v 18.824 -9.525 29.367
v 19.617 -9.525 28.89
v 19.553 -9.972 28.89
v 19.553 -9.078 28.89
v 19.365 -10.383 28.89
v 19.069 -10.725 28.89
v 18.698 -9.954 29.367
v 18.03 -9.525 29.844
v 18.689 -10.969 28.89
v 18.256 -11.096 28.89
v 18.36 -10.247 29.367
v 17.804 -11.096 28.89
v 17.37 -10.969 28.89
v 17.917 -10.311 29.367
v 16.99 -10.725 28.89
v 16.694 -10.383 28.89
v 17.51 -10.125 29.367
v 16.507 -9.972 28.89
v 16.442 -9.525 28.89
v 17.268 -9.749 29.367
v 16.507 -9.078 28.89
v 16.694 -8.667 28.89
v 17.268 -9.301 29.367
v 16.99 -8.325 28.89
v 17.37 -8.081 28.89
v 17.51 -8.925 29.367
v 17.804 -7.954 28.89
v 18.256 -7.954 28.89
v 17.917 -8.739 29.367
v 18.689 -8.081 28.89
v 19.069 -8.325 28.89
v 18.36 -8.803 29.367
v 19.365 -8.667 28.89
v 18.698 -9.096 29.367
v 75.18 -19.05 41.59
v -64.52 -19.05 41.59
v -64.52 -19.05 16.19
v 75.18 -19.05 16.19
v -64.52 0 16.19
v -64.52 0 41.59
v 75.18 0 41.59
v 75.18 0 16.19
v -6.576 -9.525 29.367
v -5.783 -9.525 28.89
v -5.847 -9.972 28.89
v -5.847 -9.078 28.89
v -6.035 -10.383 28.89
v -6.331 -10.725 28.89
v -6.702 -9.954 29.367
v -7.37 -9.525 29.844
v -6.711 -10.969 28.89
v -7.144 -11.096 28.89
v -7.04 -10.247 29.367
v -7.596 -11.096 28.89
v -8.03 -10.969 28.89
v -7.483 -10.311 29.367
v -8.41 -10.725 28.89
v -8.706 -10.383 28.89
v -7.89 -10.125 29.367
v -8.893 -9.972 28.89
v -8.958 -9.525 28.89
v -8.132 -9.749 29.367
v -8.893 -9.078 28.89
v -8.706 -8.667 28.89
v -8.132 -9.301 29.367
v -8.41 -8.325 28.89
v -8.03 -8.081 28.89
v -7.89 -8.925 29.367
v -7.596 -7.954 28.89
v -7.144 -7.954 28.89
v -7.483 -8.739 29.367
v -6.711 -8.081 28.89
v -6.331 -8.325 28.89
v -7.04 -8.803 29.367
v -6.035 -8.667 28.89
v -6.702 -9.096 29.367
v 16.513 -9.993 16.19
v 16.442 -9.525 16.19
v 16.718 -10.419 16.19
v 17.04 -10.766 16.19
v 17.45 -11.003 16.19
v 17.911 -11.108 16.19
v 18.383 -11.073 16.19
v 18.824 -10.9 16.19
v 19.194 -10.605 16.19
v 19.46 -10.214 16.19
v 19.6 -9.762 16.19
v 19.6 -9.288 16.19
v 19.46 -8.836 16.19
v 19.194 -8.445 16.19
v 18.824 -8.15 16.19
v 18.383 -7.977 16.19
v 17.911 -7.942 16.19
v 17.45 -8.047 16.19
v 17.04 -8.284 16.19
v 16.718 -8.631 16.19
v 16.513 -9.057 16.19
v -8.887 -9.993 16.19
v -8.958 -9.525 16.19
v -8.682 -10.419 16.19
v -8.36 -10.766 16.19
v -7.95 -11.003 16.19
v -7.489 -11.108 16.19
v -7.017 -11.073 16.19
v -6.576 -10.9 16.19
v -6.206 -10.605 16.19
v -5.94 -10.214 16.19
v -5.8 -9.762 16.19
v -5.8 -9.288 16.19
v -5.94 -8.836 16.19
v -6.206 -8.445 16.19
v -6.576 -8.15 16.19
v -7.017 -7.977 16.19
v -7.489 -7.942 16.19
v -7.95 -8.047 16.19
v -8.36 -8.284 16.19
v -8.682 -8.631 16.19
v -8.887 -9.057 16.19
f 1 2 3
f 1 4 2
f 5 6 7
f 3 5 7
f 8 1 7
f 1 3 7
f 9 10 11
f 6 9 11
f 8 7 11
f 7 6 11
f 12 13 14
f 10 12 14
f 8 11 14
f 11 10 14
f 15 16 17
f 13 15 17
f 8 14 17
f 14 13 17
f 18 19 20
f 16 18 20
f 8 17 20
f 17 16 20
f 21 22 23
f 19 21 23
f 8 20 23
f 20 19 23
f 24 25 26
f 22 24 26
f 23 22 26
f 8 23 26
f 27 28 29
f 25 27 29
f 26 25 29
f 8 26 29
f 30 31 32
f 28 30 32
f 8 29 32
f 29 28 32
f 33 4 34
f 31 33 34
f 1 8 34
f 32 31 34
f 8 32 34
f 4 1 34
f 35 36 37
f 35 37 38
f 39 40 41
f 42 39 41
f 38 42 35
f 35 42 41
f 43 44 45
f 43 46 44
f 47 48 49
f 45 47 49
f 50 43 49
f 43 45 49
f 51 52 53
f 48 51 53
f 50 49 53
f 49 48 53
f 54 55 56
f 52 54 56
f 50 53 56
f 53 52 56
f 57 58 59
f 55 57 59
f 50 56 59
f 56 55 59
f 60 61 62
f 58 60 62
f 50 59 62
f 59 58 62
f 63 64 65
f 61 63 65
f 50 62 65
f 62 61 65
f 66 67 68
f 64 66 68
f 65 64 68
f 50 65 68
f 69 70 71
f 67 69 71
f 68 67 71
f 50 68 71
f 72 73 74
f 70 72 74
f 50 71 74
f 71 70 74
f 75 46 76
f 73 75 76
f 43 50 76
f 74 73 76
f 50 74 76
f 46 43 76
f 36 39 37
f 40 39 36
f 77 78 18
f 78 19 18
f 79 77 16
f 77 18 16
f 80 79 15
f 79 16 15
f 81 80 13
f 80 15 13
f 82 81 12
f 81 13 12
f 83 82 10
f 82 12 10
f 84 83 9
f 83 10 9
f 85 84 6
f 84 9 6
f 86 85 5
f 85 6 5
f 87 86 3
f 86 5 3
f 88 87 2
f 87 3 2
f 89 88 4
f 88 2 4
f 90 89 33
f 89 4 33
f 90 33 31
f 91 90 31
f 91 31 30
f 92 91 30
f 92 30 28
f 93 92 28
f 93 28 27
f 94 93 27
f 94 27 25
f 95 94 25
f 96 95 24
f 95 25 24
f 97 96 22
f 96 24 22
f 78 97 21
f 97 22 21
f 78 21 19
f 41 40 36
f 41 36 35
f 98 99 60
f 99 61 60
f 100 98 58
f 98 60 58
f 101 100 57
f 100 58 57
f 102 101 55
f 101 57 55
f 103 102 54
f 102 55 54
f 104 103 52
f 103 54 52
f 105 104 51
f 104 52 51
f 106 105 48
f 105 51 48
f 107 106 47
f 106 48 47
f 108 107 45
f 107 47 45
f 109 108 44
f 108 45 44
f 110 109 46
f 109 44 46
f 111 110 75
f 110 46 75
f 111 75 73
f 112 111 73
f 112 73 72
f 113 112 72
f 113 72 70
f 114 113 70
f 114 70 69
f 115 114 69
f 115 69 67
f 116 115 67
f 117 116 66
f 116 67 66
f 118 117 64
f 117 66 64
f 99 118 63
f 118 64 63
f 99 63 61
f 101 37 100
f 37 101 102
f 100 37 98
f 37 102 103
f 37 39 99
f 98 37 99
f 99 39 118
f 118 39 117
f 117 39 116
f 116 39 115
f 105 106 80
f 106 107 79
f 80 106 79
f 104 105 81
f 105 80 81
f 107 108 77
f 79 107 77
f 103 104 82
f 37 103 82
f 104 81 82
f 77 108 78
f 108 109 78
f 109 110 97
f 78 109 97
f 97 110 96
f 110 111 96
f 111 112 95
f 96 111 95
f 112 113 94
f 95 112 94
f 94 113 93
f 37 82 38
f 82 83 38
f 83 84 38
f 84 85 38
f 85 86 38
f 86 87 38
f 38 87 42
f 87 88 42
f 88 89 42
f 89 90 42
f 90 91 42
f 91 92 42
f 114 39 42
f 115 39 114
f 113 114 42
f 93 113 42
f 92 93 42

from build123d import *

# Parameters (mm, degrees)
F0_W     = 139.7
F0_H     = 25.4
F1_DEPTH = 19.05
F3_D     = 3.175
F3_DEPTH = 12.7
F3_TIP   = 0.9538662327


with BuildPart() as f1:
    # F0 (on Front) → F1 (new body)
    with BuildSketch(Plane.XZ):
        with Locations((5.3298424567, 28.8898755878)):
            Rectangle(F0_W, F0_H)
    extrude(amount=F1_DEPTH)

    # F3
    with Locations(Plane(origin=(0, 0, 16.1898755878), x_dir=(1, 0, 0), z_dir=(0, 0, -1))):
        with Locations((-7.3701575433, 9.525), (18.0298424567, 9.525)):
            Hole(F3_D / 2, depth=F3_DEPTH)
            with Locations((0, 0, -(F3_DEPTH + F3_TIP / 2))):  # 118° drill point
                Cone(0, F3_D / 2, F3_TIP, mode=Mode.SUBTRACT)


solid = f1.part
